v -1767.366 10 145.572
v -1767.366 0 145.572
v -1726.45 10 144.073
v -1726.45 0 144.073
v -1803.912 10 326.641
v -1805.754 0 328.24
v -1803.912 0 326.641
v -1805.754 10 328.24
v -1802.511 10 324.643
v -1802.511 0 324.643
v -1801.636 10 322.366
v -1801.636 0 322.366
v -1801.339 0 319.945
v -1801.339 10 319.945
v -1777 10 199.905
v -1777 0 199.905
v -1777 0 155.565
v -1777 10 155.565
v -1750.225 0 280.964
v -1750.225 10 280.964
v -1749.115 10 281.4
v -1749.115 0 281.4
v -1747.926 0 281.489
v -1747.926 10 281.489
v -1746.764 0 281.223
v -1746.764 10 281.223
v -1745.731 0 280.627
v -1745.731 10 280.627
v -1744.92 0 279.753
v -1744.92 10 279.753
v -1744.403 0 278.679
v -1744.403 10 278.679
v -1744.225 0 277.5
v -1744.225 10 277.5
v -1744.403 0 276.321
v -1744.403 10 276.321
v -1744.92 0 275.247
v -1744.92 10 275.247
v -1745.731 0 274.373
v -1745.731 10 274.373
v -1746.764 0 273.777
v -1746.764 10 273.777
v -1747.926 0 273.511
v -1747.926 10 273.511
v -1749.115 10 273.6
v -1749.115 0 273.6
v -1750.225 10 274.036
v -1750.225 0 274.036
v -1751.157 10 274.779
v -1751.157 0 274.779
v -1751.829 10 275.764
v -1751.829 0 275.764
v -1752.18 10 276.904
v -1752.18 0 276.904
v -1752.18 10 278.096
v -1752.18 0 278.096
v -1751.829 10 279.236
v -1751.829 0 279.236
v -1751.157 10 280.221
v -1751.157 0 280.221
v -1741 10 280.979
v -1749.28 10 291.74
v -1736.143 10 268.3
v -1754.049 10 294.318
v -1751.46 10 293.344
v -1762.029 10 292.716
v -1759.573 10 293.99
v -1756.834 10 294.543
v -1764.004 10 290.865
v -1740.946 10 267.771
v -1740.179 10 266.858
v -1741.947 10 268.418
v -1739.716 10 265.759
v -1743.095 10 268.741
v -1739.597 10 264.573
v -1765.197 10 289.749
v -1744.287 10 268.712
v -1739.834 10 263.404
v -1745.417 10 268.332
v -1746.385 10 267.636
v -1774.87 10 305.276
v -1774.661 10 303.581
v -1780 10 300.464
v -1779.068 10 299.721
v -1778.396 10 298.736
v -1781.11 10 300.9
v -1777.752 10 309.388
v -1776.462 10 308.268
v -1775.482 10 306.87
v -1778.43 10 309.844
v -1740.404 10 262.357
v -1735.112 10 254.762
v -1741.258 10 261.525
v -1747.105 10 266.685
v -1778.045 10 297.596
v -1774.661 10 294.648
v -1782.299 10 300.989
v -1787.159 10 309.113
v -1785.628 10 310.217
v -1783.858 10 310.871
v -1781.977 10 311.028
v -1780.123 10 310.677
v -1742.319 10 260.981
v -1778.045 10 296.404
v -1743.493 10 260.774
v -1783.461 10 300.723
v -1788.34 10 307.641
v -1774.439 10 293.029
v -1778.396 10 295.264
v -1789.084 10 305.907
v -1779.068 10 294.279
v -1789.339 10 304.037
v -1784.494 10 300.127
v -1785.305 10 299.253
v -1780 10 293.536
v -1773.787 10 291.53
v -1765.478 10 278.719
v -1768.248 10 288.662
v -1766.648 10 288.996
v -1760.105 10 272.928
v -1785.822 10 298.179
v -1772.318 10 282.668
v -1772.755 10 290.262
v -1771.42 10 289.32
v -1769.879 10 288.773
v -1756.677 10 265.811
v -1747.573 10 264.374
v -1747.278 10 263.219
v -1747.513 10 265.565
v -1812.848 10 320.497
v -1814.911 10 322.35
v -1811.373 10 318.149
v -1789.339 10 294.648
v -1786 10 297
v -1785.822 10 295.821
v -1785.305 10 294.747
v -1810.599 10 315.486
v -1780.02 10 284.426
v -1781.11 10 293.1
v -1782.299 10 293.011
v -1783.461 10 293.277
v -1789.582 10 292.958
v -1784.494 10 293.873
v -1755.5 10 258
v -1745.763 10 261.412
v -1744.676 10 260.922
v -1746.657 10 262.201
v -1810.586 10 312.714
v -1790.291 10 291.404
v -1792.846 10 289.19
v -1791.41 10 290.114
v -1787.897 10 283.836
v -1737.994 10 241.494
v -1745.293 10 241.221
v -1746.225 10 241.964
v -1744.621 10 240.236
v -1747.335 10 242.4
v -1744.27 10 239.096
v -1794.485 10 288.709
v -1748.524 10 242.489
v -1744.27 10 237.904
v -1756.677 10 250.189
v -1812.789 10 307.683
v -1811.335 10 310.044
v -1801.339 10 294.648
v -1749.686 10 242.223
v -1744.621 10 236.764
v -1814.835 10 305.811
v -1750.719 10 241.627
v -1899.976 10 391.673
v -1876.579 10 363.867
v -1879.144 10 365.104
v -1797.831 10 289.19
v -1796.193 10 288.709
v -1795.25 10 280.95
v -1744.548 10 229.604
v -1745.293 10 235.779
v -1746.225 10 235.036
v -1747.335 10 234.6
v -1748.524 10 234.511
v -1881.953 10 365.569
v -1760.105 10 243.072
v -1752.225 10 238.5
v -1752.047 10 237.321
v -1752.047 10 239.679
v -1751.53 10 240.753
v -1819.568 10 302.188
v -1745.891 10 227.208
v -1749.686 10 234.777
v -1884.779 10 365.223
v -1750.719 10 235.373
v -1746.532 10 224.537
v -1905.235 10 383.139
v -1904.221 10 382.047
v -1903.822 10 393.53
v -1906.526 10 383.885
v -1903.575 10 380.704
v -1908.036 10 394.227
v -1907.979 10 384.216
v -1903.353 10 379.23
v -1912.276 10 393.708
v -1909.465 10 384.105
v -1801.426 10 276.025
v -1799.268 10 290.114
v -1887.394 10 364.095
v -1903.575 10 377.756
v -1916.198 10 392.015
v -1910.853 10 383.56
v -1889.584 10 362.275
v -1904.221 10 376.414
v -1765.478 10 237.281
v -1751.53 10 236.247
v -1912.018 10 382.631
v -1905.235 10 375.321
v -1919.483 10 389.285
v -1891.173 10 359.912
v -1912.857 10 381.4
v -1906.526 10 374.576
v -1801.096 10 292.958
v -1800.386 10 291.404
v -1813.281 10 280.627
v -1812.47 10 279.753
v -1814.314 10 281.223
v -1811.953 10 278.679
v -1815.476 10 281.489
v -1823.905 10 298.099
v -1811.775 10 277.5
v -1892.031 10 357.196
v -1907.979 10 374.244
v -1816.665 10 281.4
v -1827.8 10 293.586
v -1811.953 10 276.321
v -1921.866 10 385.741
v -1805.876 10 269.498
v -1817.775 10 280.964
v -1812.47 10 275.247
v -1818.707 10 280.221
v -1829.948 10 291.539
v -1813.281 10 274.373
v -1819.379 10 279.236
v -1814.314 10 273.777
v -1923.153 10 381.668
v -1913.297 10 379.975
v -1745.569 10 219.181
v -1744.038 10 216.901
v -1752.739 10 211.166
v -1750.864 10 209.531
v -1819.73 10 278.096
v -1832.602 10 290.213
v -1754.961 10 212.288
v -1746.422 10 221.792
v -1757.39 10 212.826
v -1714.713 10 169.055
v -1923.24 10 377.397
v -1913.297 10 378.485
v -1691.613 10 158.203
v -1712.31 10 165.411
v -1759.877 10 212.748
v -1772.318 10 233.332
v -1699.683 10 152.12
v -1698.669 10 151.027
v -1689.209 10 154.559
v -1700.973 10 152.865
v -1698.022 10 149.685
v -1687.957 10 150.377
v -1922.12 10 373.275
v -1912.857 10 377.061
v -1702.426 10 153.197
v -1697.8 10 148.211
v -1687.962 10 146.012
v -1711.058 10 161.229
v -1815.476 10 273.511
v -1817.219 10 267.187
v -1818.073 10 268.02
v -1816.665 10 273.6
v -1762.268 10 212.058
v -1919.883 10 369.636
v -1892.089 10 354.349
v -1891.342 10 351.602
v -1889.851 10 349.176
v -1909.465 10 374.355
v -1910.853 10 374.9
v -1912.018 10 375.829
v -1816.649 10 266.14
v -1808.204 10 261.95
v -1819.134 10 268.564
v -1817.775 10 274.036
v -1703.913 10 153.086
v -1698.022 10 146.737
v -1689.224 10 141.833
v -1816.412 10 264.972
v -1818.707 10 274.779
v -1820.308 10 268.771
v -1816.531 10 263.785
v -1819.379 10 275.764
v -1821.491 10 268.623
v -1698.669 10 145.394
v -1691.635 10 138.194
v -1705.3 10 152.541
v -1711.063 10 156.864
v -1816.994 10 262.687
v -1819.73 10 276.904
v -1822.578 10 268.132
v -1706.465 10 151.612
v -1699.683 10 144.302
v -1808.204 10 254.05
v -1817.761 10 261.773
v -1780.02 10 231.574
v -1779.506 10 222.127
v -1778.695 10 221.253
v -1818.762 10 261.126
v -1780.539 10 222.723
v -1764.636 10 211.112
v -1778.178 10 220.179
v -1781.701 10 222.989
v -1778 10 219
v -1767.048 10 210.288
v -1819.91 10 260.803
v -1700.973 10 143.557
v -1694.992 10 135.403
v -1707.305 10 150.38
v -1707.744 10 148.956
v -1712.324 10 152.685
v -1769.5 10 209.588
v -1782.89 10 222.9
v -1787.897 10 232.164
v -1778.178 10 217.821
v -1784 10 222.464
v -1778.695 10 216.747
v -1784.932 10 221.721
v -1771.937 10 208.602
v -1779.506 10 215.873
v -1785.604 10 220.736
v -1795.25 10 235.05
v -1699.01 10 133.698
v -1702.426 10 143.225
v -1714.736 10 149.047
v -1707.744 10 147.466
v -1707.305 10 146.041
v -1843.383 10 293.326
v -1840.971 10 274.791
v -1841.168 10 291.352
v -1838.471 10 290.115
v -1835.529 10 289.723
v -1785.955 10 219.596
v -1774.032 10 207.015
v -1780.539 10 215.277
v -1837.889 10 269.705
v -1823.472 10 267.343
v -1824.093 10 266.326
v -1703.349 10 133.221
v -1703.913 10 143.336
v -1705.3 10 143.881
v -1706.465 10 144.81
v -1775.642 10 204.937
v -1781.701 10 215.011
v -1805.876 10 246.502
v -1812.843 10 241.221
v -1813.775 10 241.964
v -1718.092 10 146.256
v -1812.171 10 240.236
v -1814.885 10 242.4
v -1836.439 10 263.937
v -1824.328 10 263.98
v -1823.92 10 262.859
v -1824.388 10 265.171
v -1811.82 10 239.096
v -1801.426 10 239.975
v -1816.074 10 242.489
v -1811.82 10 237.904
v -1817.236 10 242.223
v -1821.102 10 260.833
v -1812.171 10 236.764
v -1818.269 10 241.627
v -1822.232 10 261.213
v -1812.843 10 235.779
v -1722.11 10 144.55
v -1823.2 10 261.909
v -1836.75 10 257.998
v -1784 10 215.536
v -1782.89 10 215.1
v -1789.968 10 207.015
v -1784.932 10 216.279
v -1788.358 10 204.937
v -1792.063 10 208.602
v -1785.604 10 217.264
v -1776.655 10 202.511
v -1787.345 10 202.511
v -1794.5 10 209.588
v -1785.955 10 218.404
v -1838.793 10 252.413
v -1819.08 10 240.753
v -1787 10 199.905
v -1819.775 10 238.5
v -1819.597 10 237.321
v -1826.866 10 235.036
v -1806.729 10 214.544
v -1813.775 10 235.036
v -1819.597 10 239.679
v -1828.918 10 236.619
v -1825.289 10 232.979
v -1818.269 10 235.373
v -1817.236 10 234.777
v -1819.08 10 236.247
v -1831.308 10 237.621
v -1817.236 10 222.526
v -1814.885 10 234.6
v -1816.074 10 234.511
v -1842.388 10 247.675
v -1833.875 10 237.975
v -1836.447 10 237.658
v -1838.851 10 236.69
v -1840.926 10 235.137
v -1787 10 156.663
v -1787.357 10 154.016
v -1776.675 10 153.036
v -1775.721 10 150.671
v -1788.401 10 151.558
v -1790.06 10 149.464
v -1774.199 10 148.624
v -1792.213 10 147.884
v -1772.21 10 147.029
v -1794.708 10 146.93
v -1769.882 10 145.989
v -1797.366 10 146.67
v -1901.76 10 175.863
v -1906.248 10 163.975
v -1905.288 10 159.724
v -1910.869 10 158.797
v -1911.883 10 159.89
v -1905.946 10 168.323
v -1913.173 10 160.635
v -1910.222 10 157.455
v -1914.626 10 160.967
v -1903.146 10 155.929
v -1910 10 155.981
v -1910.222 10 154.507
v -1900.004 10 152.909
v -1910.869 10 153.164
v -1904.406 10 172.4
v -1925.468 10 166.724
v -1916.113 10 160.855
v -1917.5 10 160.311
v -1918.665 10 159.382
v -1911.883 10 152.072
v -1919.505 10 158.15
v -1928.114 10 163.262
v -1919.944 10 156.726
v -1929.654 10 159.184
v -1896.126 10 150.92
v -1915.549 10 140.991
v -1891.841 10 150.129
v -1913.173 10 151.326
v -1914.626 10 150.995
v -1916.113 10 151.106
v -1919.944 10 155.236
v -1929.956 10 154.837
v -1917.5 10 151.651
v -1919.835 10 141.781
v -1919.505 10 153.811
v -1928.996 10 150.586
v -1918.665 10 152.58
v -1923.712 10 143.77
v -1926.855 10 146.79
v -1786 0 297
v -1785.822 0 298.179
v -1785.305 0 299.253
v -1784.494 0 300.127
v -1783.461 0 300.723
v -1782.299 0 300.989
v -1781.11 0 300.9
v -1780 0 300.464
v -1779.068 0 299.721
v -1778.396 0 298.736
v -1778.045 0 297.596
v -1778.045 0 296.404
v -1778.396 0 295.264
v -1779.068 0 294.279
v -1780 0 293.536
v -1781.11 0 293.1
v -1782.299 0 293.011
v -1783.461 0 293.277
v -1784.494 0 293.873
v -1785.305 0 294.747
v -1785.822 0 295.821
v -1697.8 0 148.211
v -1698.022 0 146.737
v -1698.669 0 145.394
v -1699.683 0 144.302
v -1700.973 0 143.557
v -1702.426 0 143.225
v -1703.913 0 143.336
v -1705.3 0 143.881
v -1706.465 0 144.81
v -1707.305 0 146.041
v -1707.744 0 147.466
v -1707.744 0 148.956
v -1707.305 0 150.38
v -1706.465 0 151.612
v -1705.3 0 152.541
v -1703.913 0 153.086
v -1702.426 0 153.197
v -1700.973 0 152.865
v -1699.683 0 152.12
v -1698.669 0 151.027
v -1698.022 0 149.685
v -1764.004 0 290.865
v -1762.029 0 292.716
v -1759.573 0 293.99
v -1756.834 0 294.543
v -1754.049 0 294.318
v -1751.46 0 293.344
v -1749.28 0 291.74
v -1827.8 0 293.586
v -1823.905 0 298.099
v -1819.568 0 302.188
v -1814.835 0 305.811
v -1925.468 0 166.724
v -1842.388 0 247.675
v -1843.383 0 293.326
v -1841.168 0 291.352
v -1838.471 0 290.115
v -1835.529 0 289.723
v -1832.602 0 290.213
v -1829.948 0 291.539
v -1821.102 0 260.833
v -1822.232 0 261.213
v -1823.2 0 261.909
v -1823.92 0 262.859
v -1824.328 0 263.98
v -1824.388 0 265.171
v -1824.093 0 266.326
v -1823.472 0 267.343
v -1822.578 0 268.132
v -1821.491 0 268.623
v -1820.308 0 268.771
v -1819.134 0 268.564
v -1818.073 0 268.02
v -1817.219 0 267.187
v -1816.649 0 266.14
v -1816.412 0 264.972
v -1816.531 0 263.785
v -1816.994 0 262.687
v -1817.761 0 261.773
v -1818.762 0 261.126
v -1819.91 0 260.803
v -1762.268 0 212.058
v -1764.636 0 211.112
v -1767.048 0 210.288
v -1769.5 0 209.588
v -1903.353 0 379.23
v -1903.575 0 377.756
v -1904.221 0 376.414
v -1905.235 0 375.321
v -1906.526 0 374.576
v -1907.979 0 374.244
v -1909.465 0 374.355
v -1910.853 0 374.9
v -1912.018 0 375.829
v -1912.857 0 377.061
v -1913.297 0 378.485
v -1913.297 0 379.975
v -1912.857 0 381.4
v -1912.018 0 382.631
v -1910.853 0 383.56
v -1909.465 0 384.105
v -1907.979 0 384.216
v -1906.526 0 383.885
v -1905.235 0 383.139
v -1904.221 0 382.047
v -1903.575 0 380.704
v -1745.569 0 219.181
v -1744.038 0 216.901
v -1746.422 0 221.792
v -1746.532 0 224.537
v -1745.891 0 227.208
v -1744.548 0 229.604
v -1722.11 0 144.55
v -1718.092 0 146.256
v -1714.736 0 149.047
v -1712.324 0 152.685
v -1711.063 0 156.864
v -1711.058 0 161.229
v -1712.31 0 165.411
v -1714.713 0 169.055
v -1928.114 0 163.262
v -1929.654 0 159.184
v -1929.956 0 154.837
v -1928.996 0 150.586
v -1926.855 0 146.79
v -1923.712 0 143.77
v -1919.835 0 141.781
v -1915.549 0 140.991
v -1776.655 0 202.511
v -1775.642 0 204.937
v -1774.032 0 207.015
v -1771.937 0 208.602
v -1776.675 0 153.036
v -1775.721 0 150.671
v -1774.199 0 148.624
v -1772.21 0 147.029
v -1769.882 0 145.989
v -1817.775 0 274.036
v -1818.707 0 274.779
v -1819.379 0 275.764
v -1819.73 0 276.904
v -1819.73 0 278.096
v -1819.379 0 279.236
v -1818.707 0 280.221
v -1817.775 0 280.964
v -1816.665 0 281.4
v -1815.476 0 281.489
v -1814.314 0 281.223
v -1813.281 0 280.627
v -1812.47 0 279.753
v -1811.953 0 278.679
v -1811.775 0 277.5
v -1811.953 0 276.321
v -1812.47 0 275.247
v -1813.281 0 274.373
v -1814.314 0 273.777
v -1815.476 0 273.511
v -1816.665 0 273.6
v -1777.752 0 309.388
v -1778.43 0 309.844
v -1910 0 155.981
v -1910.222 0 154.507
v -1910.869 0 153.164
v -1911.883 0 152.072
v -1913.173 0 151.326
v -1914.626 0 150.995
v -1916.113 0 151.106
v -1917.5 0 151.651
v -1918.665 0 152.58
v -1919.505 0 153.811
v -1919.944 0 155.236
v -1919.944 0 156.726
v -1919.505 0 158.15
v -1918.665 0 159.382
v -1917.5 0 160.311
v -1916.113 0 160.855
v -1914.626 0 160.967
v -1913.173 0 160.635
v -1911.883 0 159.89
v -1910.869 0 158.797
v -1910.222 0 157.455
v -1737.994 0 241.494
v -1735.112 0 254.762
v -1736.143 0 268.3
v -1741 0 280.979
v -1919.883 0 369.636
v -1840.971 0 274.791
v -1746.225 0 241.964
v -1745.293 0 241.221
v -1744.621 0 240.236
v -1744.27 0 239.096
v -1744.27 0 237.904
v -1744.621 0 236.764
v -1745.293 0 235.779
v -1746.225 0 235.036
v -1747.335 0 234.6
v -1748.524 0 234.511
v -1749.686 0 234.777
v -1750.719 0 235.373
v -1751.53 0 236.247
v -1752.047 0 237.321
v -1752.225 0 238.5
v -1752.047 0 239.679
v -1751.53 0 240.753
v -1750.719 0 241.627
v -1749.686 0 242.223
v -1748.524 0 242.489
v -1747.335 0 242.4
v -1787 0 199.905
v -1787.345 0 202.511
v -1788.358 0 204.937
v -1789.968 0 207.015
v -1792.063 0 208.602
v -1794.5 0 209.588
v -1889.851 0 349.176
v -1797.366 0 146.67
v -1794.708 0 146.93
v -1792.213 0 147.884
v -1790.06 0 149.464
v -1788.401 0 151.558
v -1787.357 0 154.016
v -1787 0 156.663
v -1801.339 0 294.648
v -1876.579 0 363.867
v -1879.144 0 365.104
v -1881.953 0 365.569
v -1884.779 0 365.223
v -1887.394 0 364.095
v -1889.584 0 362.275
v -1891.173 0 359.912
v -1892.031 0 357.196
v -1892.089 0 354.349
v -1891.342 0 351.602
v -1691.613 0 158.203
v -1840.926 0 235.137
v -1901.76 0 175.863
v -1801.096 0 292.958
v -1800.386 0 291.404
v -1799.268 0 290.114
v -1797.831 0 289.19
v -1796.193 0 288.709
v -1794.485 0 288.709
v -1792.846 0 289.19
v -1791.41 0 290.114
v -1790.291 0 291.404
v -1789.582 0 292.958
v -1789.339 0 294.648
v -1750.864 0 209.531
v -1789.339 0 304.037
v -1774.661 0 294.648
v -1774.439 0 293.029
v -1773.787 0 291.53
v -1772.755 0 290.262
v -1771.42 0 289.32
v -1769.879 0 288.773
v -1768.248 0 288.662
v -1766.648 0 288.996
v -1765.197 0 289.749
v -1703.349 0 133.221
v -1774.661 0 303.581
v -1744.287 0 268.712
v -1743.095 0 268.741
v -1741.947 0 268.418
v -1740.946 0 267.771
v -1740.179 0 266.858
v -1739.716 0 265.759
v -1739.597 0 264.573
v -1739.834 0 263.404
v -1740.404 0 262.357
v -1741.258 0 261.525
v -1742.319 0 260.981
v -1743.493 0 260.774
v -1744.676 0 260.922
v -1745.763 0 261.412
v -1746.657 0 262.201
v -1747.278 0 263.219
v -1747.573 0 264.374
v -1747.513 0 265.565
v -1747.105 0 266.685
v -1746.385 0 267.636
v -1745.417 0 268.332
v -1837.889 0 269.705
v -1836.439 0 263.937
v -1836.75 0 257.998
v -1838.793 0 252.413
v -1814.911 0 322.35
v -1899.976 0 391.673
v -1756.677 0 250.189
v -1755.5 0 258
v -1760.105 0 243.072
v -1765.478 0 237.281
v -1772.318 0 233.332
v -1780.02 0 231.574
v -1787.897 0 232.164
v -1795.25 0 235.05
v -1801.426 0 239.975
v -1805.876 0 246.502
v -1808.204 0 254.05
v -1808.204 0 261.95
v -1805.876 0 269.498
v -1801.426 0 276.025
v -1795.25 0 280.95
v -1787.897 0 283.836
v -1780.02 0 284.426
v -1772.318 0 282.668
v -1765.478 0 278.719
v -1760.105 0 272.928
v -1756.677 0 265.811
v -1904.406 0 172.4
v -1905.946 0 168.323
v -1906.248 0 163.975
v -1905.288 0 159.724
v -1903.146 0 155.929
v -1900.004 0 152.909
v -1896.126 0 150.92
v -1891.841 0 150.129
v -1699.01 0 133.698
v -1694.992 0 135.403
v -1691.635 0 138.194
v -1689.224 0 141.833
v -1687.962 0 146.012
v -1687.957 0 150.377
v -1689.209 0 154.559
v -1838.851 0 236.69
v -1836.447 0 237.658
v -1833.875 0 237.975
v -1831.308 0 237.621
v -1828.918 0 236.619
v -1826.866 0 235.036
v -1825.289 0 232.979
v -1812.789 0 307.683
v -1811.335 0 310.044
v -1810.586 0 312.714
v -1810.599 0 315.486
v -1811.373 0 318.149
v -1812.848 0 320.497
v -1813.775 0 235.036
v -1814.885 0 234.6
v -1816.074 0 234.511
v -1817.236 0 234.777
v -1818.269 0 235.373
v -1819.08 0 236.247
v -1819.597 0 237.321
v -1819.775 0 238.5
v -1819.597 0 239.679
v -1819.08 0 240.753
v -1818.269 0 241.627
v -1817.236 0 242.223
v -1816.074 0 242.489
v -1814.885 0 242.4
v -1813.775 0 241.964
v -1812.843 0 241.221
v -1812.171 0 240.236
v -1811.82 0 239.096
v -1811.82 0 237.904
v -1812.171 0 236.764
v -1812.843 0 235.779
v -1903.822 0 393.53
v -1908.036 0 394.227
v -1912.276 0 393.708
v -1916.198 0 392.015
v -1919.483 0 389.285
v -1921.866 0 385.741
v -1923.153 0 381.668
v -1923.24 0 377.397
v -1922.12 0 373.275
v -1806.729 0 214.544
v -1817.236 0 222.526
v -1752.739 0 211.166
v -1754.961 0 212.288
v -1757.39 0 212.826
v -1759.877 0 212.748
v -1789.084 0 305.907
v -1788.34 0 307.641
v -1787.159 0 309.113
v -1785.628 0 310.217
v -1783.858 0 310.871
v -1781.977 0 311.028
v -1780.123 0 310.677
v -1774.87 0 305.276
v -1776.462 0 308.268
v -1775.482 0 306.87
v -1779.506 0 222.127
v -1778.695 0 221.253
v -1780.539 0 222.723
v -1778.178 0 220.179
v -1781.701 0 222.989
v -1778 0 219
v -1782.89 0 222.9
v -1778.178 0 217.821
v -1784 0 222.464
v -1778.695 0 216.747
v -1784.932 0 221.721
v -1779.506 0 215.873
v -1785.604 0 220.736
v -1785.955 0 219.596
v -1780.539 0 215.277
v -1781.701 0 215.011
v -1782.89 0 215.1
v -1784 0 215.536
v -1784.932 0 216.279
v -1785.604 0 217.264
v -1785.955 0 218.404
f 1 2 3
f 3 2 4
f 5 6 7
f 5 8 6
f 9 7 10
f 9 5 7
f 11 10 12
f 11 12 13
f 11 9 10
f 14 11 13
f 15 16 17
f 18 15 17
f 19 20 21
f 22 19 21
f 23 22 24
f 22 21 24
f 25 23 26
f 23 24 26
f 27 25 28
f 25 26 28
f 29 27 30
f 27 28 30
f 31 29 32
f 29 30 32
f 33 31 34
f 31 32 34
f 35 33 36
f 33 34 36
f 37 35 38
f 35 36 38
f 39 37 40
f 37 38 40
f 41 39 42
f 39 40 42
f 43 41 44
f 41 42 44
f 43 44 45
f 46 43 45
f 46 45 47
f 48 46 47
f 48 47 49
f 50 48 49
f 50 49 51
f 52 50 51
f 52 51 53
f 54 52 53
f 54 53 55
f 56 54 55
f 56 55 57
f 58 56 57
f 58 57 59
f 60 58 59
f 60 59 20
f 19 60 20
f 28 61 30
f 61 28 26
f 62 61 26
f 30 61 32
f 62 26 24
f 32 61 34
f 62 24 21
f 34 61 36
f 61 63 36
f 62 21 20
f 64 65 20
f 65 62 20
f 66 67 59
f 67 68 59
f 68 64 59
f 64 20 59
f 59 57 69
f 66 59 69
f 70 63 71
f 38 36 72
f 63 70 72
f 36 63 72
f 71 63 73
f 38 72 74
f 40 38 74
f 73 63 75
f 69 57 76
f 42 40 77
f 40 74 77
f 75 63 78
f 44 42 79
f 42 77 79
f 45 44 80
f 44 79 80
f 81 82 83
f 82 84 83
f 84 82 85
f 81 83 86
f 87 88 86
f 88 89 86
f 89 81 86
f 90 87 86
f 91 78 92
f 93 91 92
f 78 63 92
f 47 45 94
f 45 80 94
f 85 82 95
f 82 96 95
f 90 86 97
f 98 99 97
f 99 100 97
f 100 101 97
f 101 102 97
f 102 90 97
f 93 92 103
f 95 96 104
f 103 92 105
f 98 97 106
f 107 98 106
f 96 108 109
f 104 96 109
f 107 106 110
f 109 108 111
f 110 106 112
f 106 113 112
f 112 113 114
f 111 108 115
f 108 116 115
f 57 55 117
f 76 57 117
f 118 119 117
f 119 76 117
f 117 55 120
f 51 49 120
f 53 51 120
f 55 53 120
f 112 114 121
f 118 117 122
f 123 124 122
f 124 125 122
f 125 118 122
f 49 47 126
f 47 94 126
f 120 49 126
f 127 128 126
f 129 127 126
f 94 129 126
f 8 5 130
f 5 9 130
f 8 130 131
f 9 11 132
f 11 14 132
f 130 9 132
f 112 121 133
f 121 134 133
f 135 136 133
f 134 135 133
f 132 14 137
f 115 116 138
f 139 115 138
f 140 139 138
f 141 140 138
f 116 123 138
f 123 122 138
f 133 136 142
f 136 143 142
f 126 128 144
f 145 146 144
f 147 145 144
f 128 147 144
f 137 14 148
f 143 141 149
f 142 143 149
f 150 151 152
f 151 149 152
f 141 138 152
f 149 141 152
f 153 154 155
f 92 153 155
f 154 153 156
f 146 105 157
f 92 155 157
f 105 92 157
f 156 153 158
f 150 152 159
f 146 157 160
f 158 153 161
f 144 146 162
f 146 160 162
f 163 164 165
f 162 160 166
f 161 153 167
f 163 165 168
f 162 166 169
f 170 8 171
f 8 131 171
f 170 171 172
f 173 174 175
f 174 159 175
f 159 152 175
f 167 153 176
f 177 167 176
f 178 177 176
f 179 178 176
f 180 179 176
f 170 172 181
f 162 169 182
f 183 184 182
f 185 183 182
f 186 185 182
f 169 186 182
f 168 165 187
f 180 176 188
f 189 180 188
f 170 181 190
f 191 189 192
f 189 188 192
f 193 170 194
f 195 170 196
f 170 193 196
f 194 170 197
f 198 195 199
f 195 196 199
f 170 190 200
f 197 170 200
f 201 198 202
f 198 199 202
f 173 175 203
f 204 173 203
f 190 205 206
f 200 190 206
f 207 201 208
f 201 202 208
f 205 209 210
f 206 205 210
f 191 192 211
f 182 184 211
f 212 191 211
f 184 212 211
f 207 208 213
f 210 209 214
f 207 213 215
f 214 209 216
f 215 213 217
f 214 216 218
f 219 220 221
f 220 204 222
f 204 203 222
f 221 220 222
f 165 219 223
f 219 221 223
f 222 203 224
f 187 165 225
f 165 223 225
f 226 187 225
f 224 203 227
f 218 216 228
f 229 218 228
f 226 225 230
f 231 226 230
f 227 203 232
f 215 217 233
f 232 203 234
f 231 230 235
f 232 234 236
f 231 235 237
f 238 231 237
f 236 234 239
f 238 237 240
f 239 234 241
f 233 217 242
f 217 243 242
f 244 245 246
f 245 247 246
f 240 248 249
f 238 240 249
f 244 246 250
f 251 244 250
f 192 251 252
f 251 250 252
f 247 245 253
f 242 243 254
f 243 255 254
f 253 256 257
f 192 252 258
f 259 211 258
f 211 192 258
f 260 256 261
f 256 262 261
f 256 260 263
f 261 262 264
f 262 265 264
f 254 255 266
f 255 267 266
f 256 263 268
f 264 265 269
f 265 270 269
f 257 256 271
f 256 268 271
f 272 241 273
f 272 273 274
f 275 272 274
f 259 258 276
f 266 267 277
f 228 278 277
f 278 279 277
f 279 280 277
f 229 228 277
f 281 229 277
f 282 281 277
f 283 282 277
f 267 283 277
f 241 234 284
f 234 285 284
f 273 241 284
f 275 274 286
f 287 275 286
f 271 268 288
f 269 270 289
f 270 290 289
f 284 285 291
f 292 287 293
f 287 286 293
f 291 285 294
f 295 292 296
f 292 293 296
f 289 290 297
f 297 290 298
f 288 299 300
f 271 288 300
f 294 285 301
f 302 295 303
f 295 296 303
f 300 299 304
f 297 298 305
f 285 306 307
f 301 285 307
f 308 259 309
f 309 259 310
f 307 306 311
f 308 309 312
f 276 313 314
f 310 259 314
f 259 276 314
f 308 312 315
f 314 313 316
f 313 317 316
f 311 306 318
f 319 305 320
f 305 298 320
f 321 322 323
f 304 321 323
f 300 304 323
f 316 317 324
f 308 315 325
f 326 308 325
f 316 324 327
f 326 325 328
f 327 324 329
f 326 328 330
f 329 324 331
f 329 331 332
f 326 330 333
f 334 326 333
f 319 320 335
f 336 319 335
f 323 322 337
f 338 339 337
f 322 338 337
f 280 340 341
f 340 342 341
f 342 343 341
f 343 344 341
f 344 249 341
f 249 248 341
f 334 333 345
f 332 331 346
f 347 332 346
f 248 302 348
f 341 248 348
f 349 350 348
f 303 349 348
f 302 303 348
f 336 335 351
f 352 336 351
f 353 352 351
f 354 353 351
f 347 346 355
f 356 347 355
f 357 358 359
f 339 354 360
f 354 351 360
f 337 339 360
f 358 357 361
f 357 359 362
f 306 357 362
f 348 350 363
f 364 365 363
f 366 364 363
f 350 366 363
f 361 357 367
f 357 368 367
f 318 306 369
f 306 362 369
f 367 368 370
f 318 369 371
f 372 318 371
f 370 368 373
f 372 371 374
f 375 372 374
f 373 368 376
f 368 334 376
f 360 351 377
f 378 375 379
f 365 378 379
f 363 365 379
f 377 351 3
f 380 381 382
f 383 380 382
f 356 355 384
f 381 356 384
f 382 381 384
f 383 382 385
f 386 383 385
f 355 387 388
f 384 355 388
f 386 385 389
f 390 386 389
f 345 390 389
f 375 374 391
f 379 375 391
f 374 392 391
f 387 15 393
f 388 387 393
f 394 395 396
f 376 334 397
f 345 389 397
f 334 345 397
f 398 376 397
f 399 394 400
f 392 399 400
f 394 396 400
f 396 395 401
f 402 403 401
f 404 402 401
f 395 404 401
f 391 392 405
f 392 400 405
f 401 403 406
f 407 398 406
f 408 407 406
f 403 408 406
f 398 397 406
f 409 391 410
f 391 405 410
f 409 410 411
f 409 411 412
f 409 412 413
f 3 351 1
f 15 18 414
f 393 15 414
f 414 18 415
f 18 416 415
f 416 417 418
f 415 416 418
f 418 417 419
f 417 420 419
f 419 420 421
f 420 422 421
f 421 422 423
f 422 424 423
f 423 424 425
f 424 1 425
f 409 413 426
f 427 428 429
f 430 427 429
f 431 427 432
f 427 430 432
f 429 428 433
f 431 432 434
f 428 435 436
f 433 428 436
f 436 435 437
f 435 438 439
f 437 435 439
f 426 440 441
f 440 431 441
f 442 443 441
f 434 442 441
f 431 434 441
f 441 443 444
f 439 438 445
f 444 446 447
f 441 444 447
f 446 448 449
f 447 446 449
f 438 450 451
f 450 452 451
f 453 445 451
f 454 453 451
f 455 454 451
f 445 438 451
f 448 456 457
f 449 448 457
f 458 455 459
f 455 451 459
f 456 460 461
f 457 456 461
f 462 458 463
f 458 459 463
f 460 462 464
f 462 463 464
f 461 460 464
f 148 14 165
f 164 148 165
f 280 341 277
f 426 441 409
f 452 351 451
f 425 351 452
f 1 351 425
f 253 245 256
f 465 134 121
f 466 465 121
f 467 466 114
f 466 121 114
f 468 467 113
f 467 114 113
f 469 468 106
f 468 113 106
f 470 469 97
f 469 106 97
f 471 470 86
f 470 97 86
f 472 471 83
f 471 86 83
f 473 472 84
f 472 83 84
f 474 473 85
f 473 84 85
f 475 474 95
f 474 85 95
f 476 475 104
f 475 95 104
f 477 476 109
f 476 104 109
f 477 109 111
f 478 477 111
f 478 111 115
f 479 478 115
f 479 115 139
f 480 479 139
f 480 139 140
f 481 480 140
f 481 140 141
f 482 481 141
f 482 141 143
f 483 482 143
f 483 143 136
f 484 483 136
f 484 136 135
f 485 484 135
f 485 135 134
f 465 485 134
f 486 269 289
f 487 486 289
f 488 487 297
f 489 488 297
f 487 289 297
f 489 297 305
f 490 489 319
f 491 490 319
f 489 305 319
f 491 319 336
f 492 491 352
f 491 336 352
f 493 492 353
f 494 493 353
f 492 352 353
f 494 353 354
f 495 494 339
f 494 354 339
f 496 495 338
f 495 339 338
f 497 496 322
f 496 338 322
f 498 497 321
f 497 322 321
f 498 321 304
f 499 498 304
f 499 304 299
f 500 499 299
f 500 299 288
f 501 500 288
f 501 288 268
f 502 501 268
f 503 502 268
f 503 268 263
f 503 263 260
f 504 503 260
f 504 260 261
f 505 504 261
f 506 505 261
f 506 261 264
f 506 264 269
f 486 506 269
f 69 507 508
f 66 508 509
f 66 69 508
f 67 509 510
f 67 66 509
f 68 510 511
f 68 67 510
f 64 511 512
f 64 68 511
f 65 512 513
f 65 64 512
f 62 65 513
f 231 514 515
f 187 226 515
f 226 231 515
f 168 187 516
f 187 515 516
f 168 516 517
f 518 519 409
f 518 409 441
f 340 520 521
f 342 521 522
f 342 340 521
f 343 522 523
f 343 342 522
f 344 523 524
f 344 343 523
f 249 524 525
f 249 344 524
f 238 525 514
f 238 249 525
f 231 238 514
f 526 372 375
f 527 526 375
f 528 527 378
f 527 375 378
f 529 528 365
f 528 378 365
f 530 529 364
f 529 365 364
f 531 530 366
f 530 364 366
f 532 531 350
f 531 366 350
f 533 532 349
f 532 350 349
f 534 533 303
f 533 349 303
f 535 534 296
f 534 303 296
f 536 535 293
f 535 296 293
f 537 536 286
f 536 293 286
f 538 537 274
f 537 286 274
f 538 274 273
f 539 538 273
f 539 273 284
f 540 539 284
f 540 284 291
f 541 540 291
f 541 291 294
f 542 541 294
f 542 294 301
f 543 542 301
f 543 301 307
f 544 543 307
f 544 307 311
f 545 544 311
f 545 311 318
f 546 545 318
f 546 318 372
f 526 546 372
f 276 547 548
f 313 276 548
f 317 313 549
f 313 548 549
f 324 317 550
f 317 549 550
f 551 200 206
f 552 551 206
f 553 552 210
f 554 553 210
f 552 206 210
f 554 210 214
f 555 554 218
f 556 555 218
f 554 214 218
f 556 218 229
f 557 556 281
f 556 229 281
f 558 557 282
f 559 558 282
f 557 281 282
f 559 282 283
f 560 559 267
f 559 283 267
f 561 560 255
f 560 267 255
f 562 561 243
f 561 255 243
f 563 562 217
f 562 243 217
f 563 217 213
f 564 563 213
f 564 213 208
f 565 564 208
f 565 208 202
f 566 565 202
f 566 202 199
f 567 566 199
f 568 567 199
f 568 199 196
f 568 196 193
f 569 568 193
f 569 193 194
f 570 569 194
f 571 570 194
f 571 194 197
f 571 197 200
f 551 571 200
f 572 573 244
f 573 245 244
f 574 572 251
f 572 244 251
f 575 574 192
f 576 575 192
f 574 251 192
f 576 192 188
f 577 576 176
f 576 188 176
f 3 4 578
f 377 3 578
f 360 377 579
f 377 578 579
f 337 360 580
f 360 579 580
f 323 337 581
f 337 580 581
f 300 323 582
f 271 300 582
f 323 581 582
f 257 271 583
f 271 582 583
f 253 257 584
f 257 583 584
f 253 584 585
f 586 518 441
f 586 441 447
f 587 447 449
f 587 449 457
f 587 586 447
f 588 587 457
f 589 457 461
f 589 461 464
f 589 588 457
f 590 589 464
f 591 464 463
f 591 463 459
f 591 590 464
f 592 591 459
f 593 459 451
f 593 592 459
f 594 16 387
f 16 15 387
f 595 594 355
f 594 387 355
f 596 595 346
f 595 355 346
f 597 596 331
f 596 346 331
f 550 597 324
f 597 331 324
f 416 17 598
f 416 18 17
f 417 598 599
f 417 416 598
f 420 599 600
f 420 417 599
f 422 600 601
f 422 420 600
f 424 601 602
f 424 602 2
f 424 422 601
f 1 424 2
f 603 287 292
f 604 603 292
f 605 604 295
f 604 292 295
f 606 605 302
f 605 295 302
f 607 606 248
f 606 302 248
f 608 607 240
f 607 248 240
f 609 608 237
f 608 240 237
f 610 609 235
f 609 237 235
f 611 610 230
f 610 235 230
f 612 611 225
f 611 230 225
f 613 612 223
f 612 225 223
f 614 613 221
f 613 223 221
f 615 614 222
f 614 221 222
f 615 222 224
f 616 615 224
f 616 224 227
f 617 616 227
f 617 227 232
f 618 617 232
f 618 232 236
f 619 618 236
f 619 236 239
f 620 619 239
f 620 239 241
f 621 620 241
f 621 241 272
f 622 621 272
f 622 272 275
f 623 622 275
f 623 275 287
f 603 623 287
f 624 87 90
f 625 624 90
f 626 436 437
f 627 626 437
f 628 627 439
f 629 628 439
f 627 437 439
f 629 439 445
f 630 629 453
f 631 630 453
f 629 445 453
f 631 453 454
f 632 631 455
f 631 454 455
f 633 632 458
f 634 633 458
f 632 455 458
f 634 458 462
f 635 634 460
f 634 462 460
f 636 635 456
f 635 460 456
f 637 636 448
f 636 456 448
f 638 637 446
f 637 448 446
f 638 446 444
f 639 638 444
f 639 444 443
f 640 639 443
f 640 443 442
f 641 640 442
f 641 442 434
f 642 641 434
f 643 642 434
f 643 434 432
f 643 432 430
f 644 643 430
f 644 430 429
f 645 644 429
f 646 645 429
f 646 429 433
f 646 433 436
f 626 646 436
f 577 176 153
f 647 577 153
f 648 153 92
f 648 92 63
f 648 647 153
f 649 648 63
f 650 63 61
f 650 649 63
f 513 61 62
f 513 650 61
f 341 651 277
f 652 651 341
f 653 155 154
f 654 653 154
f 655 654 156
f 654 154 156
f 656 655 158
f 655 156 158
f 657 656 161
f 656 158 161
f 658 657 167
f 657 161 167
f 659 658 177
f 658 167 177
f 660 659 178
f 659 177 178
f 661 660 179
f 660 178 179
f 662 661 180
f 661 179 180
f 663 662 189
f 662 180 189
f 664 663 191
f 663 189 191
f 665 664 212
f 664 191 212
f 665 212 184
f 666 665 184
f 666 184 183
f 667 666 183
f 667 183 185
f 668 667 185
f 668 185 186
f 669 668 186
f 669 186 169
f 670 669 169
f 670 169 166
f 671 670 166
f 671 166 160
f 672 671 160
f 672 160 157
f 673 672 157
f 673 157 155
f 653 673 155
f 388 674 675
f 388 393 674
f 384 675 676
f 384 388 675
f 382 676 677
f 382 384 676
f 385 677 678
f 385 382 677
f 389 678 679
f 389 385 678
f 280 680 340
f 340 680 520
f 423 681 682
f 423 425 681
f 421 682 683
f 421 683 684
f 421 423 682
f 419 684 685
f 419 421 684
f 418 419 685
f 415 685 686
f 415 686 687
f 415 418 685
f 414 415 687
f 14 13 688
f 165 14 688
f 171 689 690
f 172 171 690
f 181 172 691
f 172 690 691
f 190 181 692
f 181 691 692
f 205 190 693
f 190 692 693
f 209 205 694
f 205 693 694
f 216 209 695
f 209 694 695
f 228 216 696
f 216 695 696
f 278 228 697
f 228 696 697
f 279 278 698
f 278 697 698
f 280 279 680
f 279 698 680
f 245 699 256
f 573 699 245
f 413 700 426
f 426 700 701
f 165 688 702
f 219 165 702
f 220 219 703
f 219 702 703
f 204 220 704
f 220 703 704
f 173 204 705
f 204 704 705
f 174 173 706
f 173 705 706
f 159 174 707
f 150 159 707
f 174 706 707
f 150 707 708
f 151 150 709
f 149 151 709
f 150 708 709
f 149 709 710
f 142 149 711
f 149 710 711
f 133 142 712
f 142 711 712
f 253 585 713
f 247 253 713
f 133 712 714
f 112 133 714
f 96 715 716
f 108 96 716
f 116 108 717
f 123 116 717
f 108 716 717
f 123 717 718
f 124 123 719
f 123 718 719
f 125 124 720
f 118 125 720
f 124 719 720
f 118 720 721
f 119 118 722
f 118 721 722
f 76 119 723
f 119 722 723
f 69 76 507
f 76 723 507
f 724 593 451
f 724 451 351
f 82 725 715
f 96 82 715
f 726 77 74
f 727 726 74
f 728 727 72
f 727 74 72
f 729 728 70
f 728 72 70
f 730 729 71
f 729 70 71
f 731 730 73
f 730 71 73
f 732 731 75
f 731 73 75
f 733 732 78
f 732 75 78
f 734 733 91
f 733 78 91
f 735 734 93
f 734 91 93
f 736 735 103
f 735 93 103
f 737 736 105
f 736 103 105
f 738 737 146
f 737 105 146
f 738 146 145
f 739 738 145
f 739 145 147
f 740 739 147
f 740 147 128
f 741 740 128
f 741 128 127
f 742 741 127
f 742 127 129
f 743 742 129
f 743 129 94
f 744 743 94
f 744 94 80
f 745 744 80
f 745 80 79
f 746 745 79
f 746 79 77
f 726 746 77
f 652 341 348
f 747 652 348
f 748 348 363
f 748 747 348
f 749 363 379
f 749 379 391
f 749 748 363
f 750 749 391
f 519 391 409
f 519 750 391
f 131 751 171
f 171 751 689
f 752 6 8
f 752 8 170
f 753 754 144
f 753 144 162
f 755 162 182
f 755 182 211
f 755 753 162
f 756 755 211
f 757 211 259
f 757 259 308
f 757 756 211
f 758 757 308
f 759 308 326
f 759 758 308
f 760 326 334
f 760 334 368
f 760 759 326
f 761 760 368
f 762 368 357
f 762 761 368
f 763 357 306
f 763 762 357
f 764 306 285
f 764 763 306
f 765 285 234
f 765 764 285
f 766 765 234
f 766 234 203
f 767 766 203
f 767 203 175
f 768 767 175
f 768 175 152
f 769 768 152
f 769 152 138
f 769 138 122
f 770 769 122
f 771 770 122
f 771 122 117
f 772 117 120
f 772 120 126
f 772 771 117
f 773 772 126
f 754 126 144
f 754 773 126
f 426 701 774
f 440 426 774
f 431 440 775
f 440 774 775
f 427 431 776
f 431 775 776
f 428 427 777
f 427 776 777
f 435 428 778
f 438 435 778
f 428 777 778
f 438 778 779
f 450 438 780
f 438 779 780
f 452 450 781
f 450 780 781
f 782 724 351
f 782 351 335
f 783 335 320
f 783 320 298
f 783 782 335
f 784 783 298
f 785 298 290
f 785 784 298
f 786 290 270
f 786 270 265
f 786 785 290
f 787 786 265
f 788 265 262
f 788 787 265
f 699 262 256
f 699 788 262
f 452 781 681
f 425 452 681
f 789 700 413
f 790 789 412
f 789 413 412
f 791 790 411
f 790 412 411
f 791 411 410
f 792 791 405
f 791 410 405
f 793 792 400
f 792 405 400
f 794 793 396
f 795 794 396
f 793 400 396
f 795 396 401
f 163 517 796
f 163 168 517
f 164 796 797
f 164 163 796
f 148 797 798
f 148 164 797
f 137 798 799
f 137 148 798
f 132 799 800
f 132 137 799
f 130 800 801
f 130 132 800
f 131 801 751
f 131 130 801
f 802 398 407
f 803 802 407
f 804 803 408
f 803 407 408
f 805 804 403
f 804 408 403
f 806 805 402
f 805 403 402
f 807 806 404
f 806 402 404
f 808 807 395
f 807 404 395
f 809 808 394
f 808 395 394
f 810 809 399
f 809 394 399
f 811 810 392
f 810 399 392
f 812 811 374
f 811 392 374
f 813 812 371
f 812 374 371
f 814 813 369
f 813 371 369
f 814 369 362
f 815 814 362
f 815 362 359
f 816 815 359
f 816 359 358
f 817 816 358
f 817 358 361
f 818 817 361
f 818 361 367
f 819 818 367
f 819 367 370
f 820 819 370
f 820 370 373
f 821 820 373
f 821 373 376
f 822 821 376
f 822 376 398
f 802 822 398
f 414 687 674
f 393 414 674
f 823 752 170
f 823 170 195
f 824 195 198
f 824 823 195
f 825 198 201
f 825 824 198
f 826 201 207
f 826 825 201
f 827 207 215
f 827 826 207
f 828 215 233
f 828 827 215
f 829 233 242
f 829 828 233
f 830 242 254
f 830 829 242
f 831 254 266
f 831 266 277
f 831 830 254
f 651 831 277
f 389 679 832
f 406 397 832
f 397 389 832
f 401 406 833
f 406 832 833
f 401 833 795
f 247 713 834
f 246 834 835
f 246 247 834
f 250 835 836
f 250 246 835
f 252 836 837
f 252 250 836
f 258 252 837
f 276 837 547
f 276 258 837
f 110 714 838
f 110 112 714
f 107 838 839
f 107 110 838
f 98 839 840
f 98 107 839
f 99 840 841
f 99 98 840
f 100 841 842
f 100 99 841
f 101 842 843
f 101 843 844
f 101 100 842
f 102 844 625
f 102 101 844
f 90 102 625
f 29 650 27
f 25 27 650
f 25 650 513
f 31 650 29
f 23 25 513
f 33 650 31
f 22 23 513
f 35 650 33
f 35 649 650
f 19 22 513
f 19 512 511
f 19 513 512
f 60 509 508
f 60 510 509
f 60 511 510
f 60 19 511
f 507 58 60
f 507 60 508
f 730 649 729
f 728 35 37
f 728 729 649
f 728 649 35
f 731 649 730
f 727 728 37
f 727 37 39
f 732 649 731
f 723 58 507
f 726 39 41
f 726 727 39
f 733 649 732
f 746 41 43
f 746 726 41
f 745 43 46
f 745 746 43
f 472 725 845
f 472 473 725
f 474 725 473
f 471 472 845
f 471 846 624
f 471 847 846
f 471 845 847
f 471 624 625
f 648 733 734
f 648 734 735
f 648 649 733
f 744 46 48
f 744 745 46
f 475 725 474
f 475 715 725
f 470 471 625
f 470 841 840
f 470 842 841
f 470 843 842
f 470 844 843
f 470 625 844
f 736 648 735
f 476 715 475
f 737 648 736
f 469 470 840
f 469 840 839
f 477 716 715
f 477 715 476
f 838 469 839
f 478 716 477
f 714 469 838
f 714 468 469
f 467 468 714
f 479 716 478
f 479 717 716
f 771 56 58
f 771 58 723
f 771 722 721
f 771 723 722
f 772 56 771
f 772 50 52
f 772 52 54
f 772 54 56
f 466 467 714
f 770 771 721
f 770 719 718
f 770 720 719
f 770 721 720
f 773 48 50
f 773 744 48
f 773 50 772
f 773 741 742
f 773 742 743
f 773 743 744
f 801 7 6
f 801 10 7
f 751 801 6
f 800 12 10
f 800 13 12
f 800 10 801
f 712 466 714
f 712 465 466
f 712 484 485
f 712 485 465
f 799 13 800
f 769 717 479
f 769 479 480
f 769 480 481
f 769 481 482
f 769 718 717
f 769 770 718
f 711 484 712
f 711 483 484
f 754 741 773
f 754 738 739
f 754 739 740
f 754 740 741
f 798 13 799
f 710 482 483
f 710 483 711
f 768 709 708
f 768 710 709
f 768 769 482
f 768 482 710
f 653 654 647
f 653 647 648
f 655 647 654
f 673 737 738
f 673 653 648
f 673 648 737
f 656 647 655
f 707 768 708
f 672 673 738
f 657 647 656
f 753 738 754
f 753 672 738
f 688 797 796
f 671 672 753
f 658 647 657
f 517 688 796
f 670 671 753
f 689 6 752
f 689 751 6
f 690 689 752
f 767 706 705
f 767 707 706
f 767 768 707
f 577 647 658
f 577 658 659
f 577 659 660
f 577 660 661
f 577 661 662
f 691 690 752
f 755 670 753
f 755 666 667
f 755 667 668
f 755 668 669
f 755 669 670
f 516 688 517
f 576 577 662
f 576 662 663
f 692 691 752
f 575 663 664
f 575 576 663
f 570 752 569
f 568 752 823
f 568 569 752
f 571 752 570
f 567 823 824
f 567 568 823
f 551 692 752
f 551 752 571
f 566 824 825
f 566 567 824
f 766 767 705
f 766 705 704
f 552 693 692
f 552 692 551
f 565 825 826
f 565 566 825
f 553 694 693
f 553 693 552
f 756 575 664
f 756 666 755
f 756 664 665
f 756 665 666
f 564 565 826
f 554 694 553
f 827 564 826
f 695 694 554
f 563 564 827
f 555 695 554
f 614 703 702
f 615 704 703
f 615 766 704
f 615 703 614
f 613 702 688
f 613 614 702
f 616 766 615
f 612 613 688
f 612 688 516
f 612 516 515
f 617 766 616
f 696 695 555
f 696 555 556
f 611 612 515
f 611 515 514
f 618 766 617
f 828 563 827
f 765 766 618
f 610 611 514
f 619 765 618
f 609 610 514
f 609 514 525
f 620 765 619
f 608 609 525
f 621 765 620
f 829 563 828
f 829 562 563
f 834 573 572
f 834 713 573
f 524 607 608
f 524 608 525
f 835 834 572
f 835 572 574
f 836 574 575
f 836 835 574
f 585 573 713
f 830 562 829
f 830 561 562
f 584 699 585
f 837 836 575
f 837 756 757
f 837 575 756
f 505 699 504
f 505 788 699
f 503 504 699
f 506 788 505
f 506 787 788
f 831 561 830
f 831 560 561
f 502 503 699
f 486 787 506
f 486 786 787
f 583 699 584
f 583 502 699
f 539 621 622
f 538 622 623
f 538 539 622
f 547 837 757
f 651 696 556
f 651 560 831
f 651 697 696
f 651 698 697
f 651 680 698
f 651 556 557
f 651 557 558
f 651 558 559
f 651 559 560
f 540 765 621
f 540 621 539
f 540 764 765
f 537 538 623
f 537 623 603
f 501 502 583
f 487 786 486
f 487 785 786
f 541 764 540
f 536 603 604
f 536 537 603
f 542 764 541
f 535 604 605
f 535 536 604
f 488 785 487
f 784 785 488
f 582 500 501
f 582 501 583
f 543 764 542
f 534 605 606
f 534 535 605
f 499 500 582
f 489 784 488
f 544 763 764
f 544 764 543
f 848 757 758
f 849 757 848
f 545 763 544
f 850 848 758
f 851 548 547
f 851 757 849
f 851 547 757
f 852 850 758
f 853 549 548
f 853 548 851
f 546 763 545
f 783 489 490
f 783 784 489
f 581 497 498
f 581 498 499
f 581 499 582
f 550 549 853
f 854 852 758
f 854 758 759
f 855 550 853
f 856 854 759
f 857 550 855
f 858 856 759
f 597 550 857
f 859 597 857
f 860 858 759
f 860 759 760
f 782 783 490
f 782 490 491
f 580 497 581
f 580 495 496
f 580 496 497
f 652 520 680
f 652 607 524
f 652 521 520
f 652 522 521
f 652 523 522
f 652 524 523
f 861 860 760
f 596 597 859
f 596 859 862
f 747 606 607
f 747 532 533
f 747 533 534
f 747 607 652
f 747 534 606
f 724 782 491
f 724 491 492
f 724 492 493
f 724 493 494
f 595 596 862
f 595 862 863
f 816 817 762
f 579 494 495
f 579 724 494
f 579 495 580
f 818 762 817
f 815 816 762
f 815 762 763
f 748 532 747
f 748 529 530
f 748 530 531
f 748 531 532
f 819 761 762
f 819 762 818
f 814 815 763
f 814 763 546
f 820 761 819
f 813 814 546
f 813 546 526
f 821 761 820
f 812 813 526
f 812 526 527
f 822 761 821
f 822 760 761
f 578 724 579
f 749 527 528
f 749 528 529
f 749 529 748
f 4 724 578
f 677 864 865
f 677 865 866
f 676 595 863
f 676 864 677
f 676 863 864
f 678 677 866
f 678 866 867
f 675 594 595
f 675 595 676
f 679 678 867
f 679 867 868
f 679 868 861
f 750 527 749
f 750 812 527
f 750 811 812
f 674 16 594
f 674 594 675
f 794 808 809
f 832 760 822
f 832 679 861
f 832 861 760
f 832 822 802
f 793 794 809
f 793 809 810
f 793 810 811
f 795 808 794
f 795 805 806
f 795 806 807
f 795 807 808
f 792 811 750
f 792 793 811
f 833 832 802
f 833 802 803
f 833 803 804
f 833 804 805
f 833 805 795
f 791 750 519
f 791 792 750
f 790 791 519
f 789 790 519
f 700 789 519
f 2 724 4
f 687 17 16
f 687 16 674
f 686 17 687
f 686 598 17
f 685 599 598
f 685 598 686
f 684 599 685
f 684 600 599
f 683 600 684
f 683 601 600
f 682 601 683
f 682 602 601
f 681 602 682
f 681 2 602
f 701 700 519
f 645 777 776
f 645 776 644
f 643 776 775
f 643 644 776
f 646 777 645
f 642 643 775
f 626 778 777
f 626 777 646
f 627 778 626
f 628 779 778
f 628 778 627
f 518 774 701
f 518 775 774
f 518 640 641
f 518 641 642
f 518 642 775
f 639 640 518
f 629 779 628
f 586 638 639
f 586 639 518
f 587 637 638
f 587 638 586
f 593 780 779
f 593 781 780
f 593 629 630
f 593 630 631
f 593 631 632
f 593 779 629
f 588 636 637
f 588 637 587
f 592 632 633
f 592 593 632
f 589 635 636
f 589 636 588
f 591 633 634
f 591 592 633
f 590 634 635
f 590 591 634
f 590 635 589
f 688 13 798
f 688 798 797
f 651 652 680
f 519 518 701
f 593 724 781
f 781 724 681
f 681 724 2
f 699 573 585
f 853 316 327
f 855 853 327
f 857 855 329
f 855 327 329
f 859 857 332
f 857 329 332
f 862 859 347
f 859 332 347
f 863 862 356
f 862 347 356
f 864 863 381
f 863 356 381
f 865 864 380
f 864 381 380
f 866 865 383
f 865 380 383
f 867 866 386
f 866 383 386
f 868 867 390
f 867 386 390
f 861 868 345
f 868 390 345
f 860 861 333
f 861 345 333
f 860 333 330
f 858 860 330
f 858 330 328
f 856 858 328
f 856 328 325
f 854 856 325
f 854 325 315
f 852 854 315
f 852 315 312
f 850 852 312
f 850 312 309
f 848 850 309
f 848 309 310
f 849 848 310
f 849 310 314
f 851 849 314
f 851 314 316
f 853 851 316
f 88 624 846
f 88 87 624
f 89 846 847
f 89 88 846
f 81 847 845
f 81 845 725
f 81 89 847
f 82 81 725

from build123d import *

# Parameters (mm, degrees)
SZKIC3_R                    = 26.5
DODANIE_WYCI_GNI_CIE1_DEPTH = 10
OTW_R1_D                    = 8
OTW_R1_DEPTH                = 10.001
SZYK_KO_OWY1_COUNT          = 18
OTW_R2_D                    = 10
OTW_R2_DEPTH                = 100
OTW_R3_D                    = 10
OTW_R3_DEPTH                = 100
OTW_R4_D                    = 10
OTW_R4_DEPTH                = 10
WYTNIJ_WYCI_GNI_CIE1_DEPTH  = 11
ZAOKR_GLENIE1_R             = 10
OTW_R5_D                    = 10
OTW_R5_DEPTH                = 10
WYTNIJ_WYCI_GNI_CIE2_DEPTH  = 10
ZAOKR_GLENIE2_R             = 10
ZAOKR_GLENIE7_R             = 7


with BuildPart() as part:
    # Szkic3 → Dodanie-wyciągnięcie1 (new body)
    with BuildSketch(Plane(origin=(0, 0, 0), x_dir=(1, 0, 0), z_dir=(0, 1, 0))):
        with BuildLine():
            Line((-1915.5488692, -140.99080739), (-1703.3488692, -133.220934409))
            ThreePointArc((-1703.3488692, -133.220934409), (-1689.223566168, -141.832766807), (-1691.612507096, -158.202886057))
            Line((-1691.612507096, -158.202886057), (-1750, -223.576171044))
            ThreePointArc((-1750, -223.576171044), (-1736.180289372, -268.466810303), (-1768.121254646, -302.904124837))
            Line((-1768.121254646, -302.904124837), (-1899.97553639, -391.673040436))
            ThreePointArc((-1899.97553639, -391.673040436), (-1919.48315677, -389.285445814), (-1919.883316335, -369.636330483))
            Line((-1919.883316335, -369.636330483), (-1840.970754815, -274.791431046))
            ThreePointArc((-1840.970754815, -274.791431046), (-1836.372380588, -260.955992635), (-1842.387744834, -247.675187141))
            Line((-1842.387744834, -247.675187141), (-1925.46803839, -166.72414018))
            ThreePointArc((-1925.46803839, -166.72414018), (-1928.996219751, -150.585779938), (-1915.5488692, -140.99080739))
        make_face()
        with Locations((-1782, -258)):
            Circle(SZKIC3_R, mode=Mode.SUBTRACT)
    extrude(amount=DODANIE_WYCI_GNI_CIE1_DEPTH)

    # Otwór1
    with Locations(Plane(origin=(0, 0, 0), x_dir=(-1, 0, 0), z_dir=(0, -1, 0))):
        with Locations((1782, -219)):
            otw_r1 = Hole(OTW_R1_D / 2, depth=OTW_R1_DEPTH)

    # Szyk kołowy1: Otwór1 ×18 about axis, 10 skipped
    szyk_ko_owy1_axis = Axis((-1782, 10, 258), (0, -1, 0))
    add([otw_r1.rotate(szyk_ko_owy1_axis, i * 360 / SZYK_KO_OWY1_COUNT) for i in range(1, SZYK_KO_OWY1_COUNT) if i not in (1, 2, 4, 7, 8, 10, 11, 14, 16, 17)], mode=Mode.SUBTRACT)

    # Otwór2
    with Locations(Plane(origin=(0, 0, 0), x_dir=(-1, 0, 0), z_dir=(0, -1, 0))):
        with Locations((1702.8, -148.210889132)):
            Hole(OTW_R2_D / 2, depth=OTW_R2_DEPTH)

    # Otwór3
    with Locations(Plane(origin=(0, 0, 0), x_dir=(-1, 0, 0), z_dir=(0, -1, 0))):
        with Locations((1915, -155.980762114)):
            Hole(OTW_R3_D / 2, depth=OTW_R3_DEPTH)

    # Otwór4
    with Locations(Plane(origin=(0, 0, 0), x_dir=(-1, 0, 0), z_dir=(0, -1, 0))):
        with Locations((1908.352535431, -379.230135346)):
            Hole(OTW_R4_D / 2, depth=OTW_R4_DEPTH)

    # Szkic14 → Wytnij-wyciągnięcie1 (cut, through all)
    with BuildSketch(Plane(origin=(0, 0, 0), x_dir=(-1, 0, 0), z_dir=(0, -1, 0))):
        with BuildLine():
            Line((1830.387794708, -245.405504247), (1901.759731773, -175.862742881))
            ThreePointArc((1901.759731773, -175.862742881), (1905.287913135, -159.724382638), (1891.840562583, -150.129410091))
            Line((1891.840562583, -150.129410091), (1787, -146.290588911))
            Line((1787, -146.290588911), (1787, -208.250628145))
            ThreePointArc((1787, -208.250628145), (1814.522074972, -220.02218227), (1830.387794708, -245.405504247))
        make_face()
        with BuildLine():
            Line((1777, -208.250628145), (1777, -145.9244309))
            Line((1777, -145.9244309), (1726.449545971, -144.073485533))
            ThreePointArc((1726.449545971, -144.073485533), (1712.324242939, -152.685317931), (1714.713183868, -169.05543718))
            Line((1714.713183868, -169.05543718), (1756.005588073, -215.288285581))
            ThreePointArc((1756.005588073, -215.288285581), (1766.10831827, -210.592675125), (1777, -208.250628145))
        make_face()
        with BuildLine():
            Line((1889.850904158, -349.175505229), (1834.500977493, -282.650504301))
            ThreePointArc((1834.500977493, -282.650504301), (1820.727394871, -301.176253734), (1800.818732436, -312.86214824))
            Line((1800.818732436, -312.86214824), (1876.579050862, -363.866645198))
            ThreePointArc((1876.579050862, -363.866645198), (1889.584131115, -362.27491545), (1889.850904158, -349.175505229))
        make_face()
    extrude(amount=-WYTNIJ_WYCI_GNI_CIE1_DEPTH, mode=Mode.SUBTRACT)

    # Zaokrąglenie1
    zaokr_glenie1_edges = [part.edges().sort_by_distance(p)[0] for p in [
        (-1800.818732436, 5, 312.86214824),
        (-1834.500977493, 5, 282.650504301),
        (-1777, 5, 208.250628145),
        (-1756.005588073, 5, 215.288285581),
        (-1777, 5, 145.9244309),
        (-1830.387794708, 5, 245.405504247),
        (-1787, 5, 208.250628145),
        (-1787, 5, 146.290588911),
        (-1750, 5, 223.576171044),
        (-1768.121254646, 5, 302.904124837),
    ]]
    fillet(zaokr_glenie1_edges, radius=ZAOKR_GLENIE1_R)

    # Otwór5
    with Locations(Plane(origin=(0, 0, 0), x_dir=(-1, 0, 0), z_dir=(0, -1, 0))):
        with Locations((1795.33878559, -294.648012211), (1768.66121441, -294.648012211)):
            Hole(OTW_R5_D / 2, depth=OTW_R5_DEPTH)

    # Szkic18 → Wytnij-wyciągnięcie2 (cut)
    with BuildSketch(Plane(origin=(0, 0, 0), x_dir=(-1, 0, 0), z_dir=(0, -1, 0))):
        with BuildLine():
            Line((1762.66121441, -294.648012211), (1762.66121441, -300.837032716))
            ThreePointArc((1762.66121441, -300.837032716), (1764.765334946, -301.7260371), (1766.910163713, -302.511760703))
            ThreePointArc((1766.910163713, -302.511760703), (1768.13628585, -303.020458445), (1769.284226275, -303.687078026))
            Line((1769.284226275, -303.687078026), (1774.66121441, -307.307054561))
            Line((1774.66121441, -307.307054561), (1774.66121441, -294.648012211))
            ThreePointArc((1774.66121441, -294.648012211), (1768.66121441, -288.648012211), (1762.66121441, -294.648012211))
        make_face()
        with BuildLine():
            Line((1789.33878559, -294.648012211), (1789.33878559, -317.188508997))
            Line((1789.33878559, -317.188508997), (1801.33878559, -325.267328836))
            Line((1801.33878559, -325.267328836), (1801.33878559, -294.648012211))
            ThreePointArc((1801.33878559, -294.648012211), (1795.33878559, -288.648012211), (1789.33878559, -294.648012211))
        make_face()
    extrude(amount=-WYTNIJ_WYCI_GNI_CIE2_DEPTH, mode=Mode.SUBTRACT)

    # Zaokrąglenie2
    zaokr_glenie2_edges = [part.edges().sort_by_distance(p)[0] for p in [
        (-1762.66121441, 5, 300.837032716),
        (-1801.33878559, 5, 325.267328836),
    ]]
    fillet(zaokr_glenie2_edges, radius=ZAOKR_GLENIE2_R)

    # Zaokrąglenie7
    zaokr_glenie7_edges = [part.edges().sort_by_distance(p)[0] for p in [
        (-1774.66121441, 5, 307.307054561),
        (-1789.33878559, 5, 317.188508997),
    ]]
    fillet(zaokr_glenie7_edges, radius=ZAOKR_GLENIE7_R)


solid = part.part
